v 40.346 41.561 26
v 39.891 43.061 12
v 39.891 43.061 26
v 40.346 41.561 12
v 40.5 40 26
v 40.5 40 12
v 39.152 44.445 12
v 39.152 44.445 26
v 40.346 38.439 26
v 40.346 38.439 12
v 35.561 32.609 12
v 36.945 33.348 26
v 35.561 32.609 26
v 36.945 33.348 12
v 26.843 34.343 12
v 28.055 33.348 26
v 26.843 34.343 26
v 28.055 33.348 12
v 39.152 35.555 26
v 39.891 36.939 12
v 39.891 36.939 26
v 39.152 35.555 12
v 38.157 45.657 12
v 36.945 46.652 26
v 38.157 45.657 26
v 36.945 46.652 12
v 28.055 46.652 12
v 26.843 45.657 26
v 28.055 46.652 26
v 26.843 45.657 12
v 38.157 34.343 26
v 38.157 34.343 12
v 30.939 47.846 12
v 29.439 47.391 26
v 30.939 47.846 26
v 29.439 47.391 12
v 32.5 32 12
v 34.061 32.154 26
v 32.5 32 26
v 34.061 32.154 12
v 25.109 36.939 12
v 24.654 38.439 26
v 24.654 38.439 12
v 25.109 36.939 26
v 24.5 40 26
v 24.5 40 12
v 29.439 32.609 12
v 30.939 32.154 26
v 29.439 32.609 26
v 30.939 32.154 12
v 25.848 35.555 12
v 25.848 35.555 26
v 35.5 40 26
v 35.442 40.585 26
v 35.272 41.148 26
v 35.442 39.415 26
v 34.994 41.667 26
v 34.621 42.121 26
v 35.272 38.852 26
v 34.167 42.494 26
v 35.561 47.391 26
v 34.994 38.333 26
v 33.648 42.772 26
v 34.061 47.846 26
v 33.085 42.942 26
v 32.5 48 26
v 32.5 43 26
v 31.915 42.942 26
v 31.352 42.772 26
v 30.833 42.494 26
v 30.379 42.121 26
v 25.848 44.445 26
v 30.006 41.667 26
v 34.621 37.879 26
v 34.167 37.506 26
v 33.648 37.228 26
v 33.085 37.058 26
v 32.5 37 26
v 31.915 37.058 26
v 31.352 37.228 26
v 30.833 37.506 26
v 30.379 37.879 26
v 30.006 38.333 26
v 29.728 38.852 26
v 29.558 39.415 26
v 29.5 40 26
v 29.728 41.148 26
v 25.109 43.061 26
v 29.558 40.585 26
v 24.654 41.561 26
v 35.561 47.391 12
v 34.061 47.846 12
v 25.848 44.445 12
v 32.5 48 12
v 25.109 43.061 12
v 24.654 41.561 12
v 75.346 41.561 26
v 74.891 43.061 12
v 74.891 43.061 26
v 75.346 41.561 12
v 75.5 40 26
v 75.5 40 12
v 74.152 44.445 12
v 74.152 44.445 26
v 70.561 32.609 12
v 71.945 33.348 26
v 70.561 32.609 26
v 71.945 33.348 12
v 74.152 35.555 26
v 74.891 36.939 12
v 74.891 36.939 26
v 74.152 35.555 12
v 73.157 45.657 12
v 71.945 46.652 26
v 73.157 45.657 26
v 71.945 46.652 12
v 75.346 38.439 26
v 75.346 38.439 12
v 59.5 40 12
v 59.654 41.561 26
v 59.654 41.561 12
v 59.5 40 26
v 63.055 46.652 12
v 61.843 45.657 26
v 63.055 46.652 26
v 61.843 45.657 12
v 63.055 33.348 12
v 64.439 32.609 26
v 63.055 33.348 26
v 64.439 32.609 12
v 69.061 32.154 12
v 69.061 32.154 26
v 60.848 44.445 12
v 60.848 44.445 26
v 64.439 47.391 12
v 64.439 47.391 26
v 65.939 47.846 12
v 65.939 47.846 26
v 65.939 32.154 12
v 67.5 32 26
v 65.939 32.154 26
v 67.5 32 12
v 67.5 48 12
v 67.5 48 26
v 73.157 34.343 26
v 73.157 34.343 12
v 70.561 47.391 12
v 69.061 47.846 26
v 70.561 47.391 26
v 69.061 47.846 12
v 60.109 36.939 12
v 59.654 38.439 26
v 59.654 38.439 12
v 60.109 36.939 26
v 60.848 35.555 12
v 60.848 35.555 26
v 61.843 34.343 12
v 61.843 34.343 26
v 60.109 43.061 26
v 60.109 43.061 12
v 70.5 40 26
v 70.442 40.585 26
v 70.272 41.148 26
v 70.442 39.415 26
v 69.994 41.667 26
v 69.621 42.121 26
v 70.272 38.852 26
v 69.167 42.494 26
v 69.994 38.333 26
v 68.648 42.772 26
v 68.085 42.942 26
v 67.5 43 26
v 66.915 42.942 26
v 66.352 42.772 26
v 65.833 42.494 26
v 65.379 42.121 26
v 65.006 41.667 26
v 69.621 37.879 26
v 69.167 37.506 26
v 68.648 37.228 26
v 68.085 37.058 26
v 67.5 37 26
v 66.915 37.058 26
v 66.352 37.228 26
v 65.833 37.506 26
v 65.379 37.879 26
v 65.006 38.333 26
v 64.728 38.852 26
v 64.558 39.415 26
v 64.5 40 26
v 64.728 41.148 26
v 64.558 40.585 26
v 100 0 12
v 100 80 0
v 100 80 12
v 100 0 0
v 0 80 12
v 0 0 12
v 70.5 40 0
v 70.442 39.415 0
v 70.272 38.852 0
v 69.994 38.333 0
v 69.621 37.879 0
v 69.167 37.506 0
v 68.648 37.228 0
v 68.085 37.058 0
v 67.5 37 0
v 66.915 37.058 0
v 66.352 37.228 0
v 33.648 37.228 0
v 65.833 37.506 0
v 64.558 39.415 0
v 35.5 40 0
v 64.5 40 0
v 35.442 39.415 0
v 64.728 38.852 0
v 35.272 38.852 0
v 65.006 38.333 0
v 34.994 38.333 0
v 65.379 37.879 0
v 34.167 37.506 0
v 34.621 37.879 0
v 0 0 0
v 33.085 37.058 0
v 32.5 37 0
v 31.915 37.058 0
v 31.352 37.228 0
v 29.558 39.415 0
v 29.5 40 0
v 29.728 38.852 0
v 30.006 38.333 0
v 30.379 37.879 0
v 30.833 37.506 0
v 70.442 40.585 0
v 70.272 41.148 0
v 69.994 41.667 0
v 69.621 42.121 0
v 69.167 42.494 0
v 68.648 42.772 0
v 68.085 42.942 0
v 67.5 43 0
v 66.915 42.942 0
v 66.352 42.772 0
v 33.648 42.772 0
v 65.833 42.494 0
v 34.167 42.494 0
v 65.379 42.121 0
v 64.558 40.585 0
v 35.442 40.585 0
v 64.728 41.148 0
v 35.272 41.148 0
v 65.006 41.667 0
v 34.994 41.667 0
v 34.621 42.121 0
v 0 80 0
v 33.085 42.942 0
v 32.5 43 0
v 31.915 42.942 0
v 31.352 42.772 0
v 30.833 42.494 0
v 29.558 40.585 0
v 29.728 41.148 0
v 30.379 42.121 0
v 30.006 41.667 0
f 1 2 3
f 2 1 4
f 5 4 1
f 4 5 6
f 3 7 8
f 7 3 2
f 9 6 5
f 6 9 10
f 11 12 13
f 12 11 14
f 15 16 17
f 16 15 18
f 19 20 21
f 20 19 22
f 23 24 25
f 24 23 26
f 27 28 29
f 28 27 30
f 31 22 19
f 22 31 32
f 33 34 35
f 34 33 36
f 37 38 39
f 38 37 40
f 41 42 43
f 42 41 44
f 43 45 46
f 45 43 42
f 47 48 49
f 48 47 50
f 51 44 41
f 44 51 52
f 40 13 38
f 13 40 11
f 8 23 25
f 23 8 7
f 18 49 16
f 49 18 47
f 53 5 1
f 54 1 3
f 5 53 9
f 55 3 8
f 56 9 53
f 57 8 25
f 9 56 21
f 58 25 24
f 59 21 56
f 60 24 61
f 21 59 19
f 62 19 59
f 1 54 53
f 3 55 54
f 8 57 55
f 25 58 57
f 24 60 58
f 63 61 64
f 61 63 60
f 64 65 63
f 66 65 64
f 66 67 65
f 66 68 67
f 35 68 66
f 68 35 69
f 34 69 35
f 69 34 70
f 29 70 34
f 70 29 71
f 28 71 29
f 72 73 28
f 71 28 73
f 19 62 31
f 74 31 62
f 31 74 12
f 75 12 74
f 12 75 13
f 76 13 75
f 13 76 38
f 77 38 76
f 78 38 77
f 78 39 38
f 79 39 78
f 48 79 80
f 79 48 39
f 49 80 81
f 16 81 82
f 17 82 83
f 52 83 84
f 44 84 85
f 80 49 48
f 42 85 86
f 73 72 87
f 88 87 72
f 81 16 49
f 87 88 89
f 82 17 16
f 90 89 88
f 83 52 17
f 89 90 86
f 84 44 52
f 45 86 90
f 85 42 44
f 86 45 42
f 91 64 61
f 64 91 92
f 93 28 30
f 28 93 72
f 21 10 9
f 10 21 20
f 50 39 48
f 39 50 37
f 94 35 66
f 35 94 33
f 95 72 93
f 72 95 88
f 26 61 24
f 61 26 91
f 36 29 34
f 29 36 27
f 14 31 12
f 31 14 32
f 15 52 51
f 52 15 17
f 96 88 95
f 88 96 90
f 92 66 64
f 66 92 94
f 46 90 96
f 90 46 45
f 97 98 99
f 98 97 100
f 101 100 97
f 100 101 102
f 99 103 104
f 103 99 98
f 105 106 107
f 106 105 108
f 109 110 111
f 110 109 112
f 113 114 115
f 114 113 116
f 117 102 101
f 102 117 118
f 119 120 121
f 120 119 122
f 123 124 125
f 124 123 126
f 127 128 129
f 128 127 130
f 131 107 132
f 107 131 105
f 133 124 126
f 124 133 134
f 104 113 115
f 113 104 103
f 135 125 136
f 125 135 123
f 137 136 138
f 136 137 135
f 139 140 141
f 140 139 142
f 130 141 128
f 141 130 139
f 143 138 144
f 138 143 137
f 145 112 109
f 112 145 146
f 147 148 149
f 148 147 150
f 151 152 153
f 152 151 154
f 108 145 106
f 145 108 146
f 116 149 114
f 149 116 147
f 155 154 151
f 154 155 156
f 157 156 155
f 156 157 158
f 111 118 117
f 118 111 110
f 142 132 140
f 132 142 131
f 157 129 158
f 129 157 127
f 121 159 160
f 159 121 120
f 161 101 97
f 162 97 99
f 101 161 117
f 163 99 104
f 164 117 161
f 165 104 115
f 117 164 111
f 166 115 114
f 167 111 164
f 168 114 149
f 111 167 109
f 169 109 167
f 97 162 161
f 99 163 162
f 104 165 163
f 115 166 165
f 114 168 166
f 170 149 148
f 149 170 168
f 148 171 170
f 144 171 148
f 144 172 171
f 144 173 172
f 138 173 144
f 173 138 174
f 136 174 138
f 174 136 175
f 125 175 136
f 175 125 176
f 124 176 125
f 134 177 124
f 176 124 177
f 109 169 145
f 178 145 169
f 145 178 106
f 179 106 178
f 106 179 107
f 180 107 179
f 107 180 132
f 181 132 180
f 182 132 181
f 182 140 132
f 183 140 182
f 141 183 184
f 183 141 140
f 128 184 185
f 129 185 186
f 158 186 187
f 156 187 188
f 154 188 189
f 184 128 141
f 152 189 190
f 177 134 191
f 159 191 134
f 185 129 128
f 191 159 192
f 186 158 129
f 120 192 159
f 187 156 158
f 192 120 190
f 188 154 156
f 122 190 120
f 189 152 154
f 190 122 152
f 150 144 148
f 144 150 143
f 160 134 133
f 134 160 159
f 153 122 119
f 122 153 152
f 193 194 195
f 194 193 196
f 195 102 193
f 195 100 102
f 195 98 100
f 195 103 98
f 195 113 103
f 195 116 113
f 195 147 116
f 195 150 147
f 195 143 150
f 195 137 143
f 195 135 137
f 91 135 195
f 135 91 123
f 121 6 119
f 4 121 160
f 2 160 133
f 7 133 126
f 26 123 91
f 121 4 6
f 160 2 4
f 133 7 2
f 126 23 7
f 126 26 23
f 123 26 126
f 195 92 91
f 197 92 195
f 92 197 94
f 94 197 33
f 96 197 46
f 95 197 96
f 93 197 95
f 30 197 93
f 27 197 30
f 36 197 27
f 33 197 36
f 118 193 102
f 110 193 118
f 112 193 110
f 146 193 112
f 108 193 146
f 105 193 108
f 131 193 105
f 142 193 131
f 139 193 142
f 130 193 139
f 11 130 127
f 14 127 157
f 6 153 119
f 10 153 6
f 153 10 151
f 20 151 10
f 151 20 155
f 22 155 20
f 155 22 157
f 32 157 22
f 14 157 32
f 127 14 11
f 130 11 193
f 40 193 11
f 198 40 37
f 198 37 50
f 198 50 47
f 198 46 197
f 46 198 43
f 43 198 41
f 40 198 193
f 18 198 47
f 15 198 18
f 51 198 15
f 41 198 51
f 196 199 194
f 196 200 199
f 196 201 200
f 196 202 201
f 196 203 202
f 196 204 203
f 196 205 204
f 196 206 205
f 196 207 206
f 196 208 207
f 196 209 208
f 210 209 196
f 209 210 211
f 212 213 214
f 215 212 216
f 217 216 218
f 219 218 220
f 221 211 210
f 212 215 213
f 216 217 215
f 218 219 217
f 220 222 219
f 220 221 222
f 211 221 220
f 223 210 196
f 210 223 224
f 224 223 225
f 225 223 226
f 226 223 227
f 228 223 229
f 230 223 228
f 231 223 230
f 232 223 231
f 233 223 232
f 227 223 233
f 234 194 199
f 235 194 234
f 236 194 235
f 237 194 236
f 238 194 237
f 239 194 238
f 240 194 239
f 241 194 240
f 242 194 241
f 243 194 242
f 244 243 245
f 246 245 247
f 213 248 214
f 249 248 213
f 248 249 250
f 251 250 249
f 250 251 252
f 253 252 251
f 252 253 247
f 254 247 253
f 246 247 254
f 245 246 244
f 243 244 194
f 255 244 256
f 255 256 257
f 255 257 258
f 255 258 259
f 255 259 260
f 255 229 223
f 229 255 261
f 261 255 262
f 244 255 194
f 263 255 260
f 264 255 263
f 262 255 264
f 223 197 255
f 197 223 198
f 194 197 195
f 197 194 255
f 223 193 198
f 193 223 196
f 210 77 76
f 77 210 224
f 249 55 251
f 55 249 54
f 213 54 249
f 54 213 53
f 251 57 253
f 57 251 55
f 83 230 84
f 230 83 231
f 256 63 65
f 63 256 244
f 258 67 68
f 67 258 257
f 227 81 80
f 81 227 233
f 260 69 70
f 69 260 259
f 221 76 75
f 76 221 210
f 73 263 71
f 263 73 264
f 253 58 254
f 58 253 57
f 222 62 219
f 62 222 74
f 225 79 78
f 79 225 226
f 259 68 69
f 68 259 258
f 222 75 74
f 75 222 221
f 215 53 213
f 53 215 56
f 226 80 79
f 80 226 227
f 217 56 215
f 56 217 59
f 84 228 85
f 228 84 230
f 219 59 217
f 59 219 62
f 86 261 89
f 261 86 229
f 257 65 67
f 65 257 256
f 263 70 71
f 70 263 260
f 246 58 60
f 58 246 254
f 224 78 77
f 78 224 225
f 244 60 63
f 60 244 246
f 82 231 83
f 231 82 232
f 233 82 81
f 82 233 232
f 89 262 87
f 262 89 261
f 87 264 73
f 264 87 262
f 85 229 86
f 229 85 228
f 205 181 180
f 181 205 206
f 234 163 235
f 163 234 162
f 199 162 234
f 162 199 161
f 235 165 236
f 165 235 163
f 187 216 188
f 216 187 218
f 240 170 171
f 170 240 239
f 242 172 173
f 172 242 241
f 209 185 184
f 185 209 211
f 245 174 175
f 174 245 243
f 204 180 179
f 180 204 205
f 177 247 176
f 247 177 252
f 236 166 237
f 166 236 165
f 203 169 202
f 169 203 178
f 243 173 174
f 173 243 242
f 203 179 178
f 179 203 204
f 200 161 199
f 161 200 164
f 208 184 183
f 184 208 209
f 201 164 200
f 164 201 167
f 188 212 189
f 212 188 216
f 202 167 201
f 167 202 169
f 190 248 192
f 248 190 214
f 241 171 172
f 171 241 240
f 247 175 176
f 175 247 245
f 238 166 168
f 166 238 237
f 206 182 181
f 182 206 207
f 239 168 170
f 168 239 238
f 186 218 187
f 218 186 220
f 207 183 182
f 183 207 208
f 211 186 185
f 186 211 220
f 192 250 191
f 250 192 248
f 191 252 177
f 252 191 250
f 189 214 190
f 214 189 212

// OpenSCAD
$fn = 32;

// ----------------------------------------------------------------------
// Drill jig: two_boss jig
// ----------------------------------------------------------------------

// --- parameters (mm) ---
plate_l = 100;            // plate length, X
plate_w = 80;             // plate width, Y
plate_t = 12;             // plate thickness
boss_d = 16;              // guide boss diameter
boss_h = 15;              // boss height above the plate
guide_d = 6;              // guide hole diameter
boss_pitch = 35;          // boss pitch

n_boss = 2;  // guide bosses
boss_x0 = (plate_l - (n_boss - 1) * boss_pitch) / 2;  // first boss X
boss_top = plate_t - 1 + boss_h;  // boss crown height
total_h = boss_top;  // overall height

difference() {
  union() {
  cube([plate_l, plate_w, plate_t]);
  for (i = [0 : n_boss - 1])
    translate([boss_x0 + i * boss_pitch, plate_w / 2, plate_t - 1])
      cylinder(h = boss_h, d = boss_d);
  }
  for (i = [0 : n_boss - 1])
    translate([boss_x0 + i * boss_pitch, plate_w / 2, -1])
      cylinder(h = plate_t + boss_h, d = guide_d);
}
